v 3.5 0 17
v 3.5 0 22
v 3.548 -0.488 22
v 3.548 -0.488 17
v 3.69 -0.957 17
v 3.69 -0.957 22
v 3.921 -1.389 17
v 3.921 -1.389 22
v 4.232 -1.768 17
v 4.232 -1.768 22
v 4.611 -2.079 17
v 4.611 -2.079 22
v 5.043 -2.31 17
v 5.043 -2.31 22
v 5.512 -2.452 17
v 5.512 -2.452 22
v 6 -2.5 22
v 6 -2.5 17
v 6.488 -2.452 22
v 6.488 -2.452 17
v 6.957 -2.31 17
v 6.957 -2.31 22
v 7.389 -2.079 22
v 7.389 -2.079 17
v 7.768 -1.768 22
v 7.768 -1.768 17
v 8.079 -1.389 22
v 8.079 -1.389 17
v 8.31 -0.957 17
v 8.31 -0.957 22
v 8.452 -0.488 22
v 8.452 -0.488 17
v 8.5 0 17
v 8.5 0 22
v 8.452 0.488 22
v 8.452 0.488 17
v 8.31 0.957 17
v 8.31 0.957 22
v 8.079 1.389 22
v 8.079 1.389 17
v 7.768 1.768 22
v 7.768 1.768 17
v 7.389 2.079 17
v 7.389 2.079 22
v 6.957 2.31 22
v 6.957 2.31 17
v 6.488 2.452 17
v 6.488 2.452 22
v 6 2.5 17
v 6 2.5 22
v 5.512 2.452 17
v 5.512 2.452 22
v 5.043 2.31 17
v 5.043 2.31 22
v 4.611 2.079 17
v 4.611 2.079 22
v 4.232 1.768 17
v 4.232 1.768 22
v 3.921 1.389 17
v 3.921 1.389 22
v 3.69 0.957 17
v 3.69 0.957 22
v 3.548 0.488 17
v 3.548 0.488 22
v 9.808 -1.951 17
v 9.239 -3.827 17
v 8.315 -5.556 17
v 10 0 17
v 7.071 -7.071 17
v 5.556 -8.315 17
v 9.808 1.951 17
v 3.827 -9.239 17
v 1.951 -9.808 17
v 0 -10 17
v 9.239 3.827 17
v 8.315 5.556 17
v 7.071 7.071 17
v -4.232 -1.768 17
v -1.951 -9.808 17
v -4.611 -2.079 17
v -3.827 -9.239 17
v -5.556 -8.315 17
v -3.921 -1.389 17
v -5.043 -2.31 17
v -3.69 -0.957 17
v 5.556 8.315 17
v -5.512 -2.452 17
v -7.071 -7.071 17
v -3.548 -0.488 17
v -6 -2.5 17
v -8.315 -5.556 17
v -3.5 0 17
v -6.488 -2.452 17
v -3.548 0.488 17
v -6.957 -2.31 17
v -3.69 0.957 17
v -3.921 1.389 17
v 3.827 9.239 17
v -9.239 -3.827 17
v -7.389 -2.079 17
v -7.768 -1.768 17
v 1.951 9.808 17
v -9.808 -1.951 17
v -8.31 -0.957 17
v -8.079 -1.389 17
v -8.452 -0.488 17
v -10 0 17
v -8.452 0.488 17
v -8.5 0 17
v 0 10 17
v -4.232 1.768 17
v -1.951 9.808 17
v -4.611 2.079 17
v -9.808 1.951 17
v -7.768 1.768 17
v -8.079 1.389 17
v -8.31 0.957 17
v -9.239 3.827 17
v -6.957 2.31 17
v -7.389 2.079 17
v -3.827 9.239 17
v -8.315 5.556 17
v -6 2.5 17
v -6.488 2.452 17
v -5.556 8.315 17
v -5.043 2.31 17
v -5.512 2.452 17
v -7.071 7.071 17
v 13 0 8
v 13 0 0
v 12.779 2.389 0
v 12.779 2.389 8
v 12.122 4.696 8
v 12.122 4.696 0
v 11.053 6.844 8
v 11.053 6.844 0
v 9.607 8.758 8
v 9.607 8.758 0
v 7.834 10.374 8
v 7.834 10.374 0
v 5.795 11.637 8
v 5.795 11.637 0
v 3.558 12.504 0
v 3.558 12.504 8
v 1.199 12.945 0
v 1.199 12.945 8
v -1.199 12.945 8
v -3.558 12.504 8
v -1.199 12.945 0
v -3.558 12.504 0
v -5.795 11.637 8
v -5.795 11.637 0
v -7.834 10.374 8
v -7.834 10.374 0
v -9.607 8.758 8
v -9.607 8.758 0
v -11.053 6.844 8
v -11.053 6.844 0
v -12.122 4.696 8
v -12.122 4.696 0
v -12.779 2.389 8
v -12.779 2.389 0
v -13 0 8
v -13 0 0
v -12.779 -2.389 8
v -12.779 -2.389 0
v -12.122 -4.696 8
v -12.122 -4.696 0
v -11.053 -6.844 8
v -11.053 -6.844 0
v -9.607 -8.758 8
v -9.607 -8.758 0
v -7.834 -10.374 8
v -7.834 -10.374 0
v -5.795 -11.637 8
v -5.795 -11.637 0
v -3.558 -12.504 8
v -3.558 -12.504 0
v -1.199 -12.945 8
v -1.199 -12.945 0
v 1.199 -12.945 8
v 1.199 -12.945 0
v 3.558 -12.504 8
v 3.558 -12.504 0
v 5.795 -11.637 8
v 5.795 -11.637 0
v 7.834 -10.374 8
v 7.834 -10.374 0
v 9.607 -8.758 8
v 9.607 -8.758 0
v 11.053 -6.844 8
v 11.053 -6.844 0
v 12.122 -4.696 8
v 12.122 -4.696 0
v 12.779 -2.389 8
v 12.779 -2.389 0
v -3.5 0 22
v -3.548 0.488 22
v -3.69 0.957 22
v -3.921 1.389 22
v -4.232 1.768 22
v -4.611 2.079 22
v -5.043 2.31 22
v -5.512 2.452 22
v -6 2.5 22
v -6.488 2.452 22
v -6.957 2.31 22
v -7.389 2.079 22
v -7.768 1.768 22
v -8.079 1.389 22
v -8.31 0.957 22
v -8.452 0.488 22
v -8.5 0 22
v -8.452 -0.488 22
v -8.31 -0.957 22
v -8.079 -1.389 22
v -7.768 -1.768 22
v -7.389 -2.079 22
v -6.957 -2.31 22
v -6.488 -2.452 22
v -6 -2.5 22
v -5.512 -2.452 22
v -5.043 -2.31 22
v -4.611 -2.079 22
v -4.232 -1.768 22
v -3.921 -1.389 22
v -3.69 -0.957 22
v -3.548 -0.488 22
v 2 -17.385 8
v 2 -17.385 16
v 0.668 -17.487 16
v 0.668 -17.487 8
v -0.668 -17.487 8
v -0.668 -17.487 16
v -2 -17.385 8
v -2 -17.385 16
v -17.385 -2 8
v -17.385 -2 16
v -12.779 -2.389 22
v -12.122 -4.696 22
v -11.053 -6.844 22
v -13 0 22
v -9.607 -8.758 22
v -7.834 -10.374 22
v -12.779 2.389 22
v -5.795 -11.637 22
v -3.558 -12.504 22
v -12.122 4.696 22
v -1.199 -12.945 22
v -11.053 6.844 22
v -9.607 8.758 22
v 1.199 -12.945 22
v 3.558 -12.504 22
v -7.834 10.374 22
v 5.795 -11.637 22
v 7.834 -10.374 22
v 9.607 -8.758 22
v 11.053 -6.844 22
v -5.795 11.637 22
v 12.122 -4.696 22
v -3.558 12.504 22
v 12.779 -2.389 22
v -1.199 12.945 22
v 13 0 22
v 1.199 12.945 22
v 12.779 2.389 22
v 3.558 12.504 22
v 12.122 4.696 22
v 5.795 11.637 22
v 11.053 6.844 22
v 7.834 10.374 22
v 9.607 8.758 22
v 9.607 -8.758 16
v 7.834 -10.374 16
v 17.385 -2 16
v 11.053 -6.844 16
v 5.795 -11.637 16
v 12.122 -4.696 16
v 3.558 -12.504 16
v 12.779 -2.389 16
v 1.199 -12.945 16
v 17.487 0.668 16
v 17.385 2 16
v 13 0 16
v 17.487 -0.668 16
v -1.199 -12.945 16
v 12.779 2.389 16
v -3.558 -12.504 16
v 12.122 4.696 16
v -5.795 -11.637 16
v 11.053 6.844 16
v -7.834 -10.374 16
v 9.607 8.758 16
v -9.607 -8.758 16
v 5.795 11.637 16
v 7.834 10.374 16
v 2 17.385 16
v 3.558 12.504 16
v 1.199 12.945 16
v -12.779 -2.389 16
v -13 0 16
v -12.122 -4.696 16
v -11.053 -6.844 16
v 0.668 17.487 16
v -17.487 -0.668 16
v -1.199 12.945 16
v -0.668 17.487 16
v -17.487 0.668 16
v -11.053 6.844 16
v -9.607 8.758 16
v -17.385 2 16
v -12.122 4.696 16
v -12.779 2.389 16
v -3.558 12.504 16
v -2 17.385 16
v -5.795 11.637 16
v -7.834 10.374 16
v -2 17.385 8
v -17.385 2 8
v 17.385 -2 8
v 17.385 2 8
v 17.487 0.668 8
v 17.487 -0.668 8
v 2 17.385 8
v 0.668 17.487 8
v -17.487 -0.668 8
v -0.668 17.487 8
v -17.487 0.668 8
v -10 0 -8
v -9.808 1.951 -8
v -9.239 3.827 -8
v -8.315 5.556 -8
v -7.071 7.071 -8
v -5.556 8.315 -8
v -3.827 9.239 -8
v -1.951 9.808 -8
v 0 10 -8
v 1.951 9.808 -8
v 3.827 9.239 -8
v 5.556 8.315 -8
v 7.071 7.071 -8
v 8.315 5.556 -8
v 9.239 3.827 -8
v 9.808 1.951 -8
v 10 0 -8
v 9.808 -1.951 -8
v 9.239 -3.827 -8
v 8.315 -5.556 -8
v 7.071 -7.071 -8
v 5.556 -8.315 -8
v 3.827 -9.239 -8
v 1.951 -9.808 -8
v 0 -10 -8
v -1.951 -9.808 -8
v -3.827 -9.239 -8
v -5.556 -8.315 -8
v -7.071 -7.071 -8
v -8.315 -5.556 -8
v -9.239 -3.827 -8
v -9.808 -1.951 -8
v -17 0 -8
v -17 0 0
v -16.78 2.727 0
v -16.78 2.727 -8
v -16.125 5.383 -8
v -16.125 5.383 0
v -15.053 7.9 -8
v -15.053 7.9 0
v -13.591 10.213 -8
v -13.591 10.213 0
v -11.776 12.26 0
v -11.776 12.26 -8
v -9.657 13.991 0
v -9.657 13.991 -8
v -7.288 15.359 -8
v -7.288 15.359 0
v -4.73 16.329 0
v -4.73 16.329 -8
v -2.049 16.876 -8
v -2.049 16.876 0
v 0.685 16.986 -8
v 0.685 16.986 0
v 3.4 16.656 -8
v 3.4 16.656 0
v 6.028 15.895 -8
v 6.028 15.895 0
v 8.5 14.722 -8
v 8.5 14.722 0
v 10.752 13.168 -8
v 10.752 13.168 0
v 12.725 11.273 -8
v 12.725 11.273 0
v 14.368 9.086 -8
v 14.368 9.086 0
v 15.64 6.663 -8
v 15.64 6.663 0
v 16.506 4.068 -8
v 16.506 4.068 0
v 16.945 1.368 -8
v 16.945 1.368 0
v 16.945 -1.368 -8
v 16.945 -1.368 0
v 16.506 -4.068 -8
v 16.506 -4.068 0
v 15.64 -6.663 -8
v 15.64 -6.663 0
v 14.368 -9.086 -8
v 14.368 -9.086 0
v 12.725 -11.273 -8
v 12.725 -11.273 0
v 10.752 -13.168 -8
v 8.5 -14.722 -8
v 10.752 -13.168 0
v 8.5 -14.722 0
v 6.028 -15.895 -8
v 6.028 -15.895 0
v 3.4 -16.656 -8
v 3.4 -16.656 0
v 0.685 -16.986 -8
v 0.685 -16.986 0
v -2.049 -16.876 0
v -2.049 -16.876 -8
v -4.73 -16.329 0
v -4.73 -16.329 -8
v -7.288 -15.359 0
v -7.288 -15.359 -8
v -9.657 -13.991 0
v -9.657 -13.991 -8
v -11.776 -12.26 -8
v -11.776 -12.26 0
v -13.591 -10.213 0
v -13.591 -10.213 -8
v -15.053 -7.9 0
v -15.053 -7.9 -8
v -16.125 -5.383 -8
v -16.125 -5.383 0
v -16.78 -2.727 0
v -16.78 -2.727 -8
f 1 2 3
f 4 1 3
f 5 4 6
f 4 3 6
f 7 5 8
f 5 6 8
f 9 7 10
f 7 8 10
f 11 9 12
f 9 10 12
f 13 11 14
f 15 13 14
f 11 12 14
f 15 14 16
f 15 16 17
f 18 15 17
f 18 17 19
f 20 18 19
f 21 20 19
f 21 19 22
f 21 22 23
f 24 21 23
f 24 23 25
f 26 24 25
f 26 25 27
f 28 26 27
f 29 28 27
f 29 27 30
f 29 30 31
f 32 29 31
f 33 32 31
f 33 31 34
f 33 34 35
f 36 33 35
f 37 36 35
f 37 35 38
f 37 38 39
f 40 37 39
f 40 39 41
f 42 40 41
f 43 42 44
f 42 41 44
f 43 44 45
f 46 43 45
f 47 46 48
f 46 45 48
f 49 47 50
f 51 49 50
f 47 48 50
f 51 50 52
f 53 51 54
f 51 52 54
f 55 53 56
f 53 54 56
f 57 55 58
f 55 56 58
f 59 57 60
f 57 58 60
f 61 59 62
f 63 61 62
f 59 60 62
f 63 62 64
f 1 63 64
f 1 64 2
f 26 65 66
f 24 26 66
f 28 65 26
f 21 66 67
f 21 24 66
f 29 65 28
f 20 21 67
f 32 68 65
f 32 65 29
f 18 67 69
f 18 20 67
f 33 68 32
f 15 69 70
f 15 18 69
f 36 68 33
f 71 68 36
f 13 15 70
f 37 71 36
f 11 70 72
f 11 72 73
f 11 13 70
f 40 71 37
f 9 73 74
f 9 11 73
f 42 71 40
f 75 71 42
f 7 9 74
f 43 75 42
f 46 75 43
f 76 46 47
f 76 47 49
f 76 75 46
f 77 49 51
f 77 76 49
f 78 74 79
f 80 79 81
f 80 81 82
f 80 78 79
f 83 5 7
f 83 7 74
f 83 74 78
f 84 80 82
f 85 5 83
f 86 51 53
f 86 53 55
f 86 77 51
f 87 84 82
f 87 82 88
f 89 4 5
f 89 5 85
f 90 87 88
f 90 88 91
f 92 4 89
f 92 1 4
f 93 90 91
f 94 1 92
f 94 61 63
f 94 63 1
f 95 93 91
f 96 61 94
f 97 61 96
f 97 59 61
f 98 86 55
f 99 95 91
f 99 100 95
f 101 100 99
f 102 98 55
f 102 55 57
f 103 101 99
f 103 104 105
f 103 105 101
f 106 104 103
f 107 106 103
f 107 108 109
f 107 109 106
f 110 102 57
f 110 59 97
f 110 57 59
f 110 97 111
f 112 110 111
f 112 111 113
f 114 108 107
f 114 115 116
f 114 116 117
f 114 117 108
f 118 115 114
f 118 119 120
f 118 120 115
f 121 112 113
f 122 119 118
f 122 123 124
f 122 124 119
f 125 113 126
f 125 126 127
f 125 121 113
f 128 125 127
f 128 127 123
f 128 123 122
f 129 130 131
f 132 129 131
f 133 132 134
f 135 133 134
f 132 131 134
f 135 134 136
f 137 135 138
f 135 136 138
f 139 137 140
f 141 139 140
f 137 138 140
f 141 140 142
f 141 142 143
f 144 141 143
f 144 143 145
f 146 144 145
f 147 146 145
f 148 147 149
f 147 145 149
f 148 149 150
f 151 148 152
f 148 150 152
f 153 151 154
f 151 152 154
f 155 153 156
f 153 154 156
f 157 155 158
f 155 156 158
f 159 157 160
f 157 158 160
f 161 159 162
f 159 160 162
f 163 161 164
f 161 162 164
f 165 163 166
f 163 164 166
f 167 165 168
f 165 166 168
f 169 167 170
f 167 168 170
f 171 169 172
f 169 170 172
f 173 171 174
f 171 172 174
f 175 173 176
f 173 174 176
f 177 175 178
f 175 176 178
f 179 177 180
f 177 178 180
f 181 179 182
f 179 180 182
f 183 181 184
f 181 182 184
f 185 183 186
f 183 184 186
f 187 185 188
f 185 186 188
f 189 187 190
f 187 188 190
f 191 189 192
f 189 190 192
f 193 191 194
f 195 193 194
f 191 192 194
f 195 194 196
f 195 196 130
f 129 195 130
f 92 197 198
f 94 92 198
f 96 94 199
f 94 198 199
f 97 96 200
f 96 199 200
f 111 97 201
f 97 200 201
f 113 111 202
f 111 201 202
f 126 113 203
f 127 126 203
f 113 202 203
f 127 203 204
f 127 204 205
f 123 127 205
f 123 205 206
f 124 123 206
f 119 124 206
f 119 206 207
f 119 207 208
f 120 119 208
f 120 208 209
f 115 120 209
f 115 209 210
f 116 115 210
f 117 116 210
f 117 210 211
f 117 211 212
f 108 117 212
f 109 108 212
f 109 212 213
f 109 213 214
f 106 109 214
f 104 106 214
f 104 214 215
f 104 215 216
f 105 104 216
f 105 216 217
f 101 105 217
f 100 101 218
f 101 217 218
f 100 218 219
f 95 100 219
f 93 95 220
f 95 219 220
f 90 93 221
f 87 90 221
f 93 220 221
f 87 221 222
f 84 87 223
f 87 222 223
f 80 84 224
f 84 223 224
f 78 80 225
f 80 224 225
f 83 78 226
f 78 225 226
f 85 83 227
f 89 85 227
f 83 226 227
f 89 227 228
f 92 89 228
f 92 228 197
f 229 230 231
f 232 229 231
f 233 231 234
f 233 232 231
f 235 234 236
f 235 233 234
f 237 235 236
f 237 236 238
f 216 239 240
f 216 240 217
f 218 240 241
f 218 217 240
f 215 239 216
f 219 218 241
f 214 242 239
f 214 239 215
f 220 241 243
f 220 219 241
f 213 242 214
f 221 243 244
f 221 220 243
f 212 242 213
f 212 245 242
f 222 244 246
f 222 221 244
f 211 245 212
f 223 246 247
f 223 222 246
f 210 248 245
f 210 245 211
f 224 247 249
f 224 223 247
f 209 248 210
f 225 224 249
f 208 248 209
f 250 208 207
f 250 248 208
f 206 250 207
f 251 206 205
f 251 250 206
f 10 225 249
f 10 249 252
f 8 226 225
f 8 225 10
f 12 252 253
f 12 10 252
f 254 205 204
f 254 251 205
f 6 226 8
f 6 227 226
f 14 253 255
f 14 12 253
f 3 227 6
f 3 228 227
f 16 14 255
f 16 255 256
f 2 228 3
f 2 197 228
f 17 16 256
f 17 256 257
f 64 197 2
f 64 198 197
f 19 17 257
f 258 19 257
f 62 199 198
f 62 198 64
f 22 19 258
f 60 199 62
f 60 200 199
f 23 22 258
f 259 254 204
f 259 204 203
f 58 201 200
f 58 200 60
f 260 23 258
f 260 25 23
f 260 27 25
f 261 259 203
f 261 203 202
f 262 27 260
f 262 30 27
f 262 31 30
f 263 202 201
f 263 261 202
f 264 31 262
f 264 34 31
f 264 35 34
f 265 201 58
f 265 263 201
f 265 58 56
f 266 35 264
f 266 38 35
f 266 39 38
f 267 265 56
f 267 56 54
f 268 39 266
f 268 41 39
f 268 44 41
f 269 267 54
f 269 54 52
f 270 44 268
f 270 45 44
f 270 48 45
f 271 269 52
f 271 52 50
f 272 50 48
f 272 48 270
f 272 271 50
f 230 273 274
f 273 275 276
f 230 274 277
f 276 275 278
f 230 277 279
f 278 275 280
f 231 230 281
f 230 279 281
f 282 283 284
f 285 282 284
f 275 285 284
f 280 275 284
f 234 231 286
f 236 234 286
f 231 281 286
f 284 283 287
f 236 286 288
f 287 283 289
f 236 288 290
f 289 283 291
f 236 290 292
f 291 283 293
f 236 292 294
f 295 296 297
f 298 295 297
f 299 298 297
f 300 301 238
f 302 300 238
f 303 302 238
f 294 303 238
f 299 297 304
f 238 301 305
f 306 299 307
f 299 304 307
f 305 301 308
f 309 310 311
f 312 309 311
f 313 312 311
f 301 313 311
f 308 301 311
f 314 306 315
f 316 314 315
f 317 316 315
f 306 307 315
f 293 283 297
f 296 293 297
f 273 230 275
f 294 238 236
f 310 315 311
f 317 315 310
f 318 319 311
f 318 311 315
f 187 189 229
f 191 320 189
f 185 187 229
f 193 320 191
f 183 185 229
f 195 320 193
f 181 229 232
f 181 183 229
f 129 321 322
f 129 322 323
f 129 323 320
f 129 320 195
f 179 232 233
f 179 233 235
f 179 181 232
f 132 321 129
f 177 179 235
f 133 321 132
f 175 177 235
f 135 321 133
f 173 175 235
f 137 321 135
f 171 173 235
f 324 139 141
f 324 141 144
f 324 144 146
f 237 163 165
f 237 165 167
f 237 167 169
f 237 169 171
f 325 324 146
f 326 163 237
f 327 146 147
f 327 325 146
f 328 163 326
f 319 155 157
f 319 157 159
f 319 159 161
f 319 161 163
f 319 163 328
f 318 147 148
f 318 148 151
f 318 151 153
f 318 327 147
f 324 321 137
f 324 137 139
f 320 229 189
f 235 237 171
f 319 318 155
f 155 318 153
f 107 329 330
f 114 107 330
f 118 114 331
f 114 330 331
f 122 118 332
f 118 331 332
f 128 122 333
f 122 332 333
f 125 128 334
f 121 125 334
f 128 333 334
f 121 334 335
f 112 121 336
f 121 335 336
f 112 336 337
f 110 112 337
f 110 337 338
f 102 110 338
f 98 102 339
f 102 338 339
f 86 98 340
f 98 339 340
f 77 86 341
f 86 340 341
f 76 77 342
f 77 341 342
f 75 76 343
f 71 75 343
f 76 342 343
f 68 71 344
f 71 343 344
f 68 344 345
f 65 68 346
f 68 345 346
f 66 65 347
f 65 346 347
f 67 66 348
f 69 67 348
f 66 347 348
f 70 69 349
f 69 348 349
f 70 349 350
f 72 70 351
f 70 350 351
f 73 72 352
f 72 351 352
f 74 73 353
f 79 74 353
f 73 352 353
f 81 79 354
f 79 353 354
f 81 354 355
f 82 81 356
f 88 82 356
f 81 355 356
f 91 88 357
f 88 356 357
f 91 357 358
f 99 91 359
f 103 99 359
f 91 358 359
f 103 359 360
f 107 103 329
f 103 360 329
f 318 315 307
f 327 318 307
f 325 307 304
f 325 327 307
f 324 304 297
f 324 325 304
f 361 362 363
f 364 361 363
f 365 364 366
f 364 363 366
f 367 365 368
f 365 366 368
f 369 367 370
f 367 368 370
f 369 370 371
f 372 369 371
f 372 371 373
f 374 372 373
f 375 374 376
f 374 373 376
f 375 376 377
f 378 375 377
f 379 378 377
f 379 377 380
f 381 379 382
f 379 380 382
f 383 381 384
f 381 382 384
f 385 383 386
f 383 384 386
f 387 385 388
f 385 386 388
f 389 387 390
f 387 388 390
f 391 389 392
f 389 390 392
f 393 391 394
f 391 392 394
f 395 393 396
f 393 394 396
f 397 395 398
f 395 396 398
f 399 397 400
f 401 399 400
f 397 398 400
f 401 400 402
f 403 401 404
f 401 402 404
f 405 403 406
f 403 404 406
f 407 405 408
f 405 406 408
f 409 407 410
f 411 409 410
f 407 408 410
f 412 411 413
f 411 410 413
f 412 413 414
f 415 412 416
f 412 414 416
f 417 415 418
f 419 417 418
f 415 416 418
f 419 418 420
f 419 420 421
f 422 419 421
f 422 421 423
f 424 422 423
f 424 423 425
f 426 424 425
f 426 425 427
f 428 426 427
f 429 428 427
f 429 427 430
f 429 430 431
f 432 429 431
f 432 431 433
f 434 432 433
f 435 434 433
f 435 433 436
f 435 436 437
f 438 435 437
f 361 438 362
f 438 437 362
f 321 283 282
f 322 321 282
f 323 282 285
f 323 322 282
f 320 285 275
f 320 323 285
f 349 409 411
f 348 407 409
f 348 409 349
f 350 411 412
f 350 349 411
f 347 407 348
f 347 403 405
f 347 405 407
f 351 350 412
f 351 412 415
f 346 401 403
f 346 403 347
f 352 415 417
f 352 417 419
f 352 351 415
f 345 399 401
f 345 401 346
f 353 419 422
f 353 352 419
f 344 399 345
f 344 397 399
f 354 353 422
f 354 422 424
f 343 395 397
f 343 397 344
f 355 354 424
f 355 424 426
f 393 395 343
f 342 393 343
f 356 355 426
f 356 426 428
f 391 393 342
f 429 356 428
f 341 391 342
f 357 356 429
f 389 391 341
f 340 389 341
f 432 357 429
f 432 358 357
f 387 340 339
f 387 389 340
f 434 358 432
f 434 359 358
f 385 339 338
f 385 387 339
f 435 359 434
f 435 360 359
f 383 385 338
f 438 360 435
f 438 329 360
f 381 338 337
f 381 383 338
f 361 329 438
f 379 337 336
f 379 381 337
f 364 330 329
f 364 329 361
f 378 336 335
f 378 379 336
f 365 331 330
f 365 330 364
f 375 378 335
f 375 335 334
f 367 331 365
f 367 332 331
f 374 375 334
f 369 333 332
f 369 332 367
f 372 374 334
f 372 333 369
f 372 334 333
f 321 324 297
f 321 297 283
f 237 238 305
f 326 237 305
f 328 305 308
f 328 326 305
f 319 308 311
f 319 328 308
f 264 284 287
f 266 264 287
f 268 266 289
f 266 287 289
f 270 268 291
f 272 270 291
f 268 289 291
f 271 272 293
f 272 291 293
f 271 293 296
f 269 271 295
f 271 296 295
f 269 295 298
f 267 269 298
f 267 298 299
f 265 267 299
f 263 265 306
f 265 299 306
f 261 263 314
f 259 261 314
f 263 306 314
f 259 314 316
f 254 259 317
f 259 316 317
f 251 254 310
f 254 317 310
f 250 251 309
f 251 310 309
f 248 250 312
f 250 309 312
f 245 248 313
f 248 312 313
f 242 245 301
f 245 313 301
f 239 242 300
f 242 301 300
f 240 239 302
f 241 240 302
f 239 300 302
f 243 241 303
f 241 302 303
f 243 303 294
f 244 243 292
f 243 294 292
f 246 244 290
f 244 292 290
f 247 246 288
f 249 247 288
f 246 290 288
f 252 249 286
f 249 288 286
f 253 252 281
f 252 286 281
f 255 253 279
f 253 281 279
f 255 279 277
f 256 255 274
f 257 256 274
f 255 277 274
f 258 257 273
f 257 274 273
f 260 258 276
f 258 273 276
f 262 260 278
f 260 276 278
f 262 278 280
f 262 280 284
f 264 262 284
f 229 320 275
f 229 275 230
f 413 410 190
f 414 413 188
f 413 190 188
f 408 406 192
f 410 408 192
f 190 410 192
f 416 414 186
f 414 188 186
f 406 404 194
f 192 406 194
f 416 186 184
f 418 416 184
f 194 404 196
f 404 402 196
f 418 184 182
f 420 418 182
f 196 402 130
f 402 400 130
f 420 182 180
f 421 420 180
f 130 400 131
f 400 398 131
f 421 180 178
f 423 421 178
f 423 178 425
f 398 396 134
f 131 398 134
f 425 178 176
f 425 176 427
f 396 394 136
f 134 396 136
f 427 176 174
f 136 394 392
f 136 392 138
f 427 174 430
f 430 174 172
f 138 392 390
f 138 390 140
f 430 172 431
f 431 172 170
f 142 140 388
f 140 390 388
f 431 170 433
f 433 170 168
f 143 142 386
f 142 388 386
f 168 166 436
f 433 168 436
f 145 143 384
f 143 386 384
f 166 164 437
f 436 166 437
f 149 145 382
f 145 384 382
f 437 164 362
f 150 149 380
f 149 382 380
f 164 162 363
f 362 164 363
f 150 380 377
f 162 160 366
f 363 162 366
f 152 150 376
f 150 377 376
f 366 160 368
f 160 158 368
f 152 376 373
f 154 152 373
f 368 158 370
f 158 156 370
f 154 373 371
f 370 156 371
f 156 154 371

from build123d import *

# Parameters (mm, degrees)
SKETCH_1_R               = 13
EXTRUDE_1_DEPTH          = 8
SKETCH_2_R               = 17
EXTRUDE_2_DEPTH          = 8
EXTRUDE_3_DEPTH          = 8
SKETCH_4_R               = 13
EXTRUDE_4_DEPTH          = 6
SKETCH_5_R               = 10
CUT_EXTRUDE_1_DEPTH      = 25
SKETCH_7_R               = 2.5
CUT_EXTRUDE_3_DEPTH      = 32.5
PATTERN_CIRCULAR_1_COUNT = 2


with BuildPart() as part:
    # 草图1 → 凸台-拉伸1 (new body)
    with BuildSketch(Plane.XY):
        Circle(SKETCH_1_R)
    extrude(amount=EXTRUDE_1_DEPTH)

    # 草图2 → 凸台-拉伸2 (add)
    with BuildSketch(Plane(origin=(0, 0, 0), x_dir=(-1, 0, 0), z_dir=(0, 0, -1))):
        Circle(SKETCH_2_R)
    extrude(amount=EXTRUDE_2_DEPTH)

    # 草图3 → 凸台-拉伸3 (add)
    with BuildSketch(Plane.XY.offset(8)):
        with BuildLine():
            Line((2, 17.385338651), (17.385338651, 2))
            ThreePointArc((17.385338651, 2), (17.5, 0), (17.385338651, -2))
            Line((17.385338651, -2), (2, -17.385338651))
            ThreePointArc((2, -17.385338651), (0, -17.5), (-2, -17.385338651))
            Line((-2, -17.385338651), (-17.385338651, -2))
            ThreePointArc((-17.385338651, -2), (-17.5, 0), (-17.385338651, 2))
            Line((-17.385338651, 2), (-2, 17.385338651))
            ThreePointArc((-2, 17.385338651), (0, 17.5), (2, 17.385338651))
        make_face()
    extrude(amount=EXTRUDE_3_DEPTH)

    # 草图4 → 凸台-拉伸4 (add)
    with BuildSketch(Plane.XY.offset(16)):
        Circle(SKETCH_4_R)
    extrude(amount=EXTRUDE_4_DEPTH)

    # 草图5 → 切除-拉伸1 (cut)
    with BuildSketch(Plane(origin=(0, 0, -8), x_dir=(-1, 0, 0), z_dir=(0, 0, -1))):
        Circle(SKETCH_5_R)
    extrude(amount=-CUT_EXTRUDE_1_DEPTH, mode=Mode.SUBTRACT)

    # 草图7 → 切除-拉伸3 (cut)
    with BuildSketch(Plane.XY.offset(22)):
        with Locations((-6, 0)):
            Circle(SKETCH_7_R)
    cut_extrude_3 = extrude(amount=-CUT_EXTRUDE_3_DEPTH, mode=Mode.SUBTRACT)

    # 阵列(圆周)1: 切除-拉伸3 ×2 about axis
    pattern_circular_1_axis = Axis((0, 0, 0), (0, 0, 1))
    for i in range(1, PATTERN_CIRCULAR_1_COUNT):
        add(cut_extrude_3.rotate(pattern_circular_1_axis, i * 360 / PATTERN_CIRCULAR_1_COUNT), mode=Mode.SUBTRACT)


solid = part.part
